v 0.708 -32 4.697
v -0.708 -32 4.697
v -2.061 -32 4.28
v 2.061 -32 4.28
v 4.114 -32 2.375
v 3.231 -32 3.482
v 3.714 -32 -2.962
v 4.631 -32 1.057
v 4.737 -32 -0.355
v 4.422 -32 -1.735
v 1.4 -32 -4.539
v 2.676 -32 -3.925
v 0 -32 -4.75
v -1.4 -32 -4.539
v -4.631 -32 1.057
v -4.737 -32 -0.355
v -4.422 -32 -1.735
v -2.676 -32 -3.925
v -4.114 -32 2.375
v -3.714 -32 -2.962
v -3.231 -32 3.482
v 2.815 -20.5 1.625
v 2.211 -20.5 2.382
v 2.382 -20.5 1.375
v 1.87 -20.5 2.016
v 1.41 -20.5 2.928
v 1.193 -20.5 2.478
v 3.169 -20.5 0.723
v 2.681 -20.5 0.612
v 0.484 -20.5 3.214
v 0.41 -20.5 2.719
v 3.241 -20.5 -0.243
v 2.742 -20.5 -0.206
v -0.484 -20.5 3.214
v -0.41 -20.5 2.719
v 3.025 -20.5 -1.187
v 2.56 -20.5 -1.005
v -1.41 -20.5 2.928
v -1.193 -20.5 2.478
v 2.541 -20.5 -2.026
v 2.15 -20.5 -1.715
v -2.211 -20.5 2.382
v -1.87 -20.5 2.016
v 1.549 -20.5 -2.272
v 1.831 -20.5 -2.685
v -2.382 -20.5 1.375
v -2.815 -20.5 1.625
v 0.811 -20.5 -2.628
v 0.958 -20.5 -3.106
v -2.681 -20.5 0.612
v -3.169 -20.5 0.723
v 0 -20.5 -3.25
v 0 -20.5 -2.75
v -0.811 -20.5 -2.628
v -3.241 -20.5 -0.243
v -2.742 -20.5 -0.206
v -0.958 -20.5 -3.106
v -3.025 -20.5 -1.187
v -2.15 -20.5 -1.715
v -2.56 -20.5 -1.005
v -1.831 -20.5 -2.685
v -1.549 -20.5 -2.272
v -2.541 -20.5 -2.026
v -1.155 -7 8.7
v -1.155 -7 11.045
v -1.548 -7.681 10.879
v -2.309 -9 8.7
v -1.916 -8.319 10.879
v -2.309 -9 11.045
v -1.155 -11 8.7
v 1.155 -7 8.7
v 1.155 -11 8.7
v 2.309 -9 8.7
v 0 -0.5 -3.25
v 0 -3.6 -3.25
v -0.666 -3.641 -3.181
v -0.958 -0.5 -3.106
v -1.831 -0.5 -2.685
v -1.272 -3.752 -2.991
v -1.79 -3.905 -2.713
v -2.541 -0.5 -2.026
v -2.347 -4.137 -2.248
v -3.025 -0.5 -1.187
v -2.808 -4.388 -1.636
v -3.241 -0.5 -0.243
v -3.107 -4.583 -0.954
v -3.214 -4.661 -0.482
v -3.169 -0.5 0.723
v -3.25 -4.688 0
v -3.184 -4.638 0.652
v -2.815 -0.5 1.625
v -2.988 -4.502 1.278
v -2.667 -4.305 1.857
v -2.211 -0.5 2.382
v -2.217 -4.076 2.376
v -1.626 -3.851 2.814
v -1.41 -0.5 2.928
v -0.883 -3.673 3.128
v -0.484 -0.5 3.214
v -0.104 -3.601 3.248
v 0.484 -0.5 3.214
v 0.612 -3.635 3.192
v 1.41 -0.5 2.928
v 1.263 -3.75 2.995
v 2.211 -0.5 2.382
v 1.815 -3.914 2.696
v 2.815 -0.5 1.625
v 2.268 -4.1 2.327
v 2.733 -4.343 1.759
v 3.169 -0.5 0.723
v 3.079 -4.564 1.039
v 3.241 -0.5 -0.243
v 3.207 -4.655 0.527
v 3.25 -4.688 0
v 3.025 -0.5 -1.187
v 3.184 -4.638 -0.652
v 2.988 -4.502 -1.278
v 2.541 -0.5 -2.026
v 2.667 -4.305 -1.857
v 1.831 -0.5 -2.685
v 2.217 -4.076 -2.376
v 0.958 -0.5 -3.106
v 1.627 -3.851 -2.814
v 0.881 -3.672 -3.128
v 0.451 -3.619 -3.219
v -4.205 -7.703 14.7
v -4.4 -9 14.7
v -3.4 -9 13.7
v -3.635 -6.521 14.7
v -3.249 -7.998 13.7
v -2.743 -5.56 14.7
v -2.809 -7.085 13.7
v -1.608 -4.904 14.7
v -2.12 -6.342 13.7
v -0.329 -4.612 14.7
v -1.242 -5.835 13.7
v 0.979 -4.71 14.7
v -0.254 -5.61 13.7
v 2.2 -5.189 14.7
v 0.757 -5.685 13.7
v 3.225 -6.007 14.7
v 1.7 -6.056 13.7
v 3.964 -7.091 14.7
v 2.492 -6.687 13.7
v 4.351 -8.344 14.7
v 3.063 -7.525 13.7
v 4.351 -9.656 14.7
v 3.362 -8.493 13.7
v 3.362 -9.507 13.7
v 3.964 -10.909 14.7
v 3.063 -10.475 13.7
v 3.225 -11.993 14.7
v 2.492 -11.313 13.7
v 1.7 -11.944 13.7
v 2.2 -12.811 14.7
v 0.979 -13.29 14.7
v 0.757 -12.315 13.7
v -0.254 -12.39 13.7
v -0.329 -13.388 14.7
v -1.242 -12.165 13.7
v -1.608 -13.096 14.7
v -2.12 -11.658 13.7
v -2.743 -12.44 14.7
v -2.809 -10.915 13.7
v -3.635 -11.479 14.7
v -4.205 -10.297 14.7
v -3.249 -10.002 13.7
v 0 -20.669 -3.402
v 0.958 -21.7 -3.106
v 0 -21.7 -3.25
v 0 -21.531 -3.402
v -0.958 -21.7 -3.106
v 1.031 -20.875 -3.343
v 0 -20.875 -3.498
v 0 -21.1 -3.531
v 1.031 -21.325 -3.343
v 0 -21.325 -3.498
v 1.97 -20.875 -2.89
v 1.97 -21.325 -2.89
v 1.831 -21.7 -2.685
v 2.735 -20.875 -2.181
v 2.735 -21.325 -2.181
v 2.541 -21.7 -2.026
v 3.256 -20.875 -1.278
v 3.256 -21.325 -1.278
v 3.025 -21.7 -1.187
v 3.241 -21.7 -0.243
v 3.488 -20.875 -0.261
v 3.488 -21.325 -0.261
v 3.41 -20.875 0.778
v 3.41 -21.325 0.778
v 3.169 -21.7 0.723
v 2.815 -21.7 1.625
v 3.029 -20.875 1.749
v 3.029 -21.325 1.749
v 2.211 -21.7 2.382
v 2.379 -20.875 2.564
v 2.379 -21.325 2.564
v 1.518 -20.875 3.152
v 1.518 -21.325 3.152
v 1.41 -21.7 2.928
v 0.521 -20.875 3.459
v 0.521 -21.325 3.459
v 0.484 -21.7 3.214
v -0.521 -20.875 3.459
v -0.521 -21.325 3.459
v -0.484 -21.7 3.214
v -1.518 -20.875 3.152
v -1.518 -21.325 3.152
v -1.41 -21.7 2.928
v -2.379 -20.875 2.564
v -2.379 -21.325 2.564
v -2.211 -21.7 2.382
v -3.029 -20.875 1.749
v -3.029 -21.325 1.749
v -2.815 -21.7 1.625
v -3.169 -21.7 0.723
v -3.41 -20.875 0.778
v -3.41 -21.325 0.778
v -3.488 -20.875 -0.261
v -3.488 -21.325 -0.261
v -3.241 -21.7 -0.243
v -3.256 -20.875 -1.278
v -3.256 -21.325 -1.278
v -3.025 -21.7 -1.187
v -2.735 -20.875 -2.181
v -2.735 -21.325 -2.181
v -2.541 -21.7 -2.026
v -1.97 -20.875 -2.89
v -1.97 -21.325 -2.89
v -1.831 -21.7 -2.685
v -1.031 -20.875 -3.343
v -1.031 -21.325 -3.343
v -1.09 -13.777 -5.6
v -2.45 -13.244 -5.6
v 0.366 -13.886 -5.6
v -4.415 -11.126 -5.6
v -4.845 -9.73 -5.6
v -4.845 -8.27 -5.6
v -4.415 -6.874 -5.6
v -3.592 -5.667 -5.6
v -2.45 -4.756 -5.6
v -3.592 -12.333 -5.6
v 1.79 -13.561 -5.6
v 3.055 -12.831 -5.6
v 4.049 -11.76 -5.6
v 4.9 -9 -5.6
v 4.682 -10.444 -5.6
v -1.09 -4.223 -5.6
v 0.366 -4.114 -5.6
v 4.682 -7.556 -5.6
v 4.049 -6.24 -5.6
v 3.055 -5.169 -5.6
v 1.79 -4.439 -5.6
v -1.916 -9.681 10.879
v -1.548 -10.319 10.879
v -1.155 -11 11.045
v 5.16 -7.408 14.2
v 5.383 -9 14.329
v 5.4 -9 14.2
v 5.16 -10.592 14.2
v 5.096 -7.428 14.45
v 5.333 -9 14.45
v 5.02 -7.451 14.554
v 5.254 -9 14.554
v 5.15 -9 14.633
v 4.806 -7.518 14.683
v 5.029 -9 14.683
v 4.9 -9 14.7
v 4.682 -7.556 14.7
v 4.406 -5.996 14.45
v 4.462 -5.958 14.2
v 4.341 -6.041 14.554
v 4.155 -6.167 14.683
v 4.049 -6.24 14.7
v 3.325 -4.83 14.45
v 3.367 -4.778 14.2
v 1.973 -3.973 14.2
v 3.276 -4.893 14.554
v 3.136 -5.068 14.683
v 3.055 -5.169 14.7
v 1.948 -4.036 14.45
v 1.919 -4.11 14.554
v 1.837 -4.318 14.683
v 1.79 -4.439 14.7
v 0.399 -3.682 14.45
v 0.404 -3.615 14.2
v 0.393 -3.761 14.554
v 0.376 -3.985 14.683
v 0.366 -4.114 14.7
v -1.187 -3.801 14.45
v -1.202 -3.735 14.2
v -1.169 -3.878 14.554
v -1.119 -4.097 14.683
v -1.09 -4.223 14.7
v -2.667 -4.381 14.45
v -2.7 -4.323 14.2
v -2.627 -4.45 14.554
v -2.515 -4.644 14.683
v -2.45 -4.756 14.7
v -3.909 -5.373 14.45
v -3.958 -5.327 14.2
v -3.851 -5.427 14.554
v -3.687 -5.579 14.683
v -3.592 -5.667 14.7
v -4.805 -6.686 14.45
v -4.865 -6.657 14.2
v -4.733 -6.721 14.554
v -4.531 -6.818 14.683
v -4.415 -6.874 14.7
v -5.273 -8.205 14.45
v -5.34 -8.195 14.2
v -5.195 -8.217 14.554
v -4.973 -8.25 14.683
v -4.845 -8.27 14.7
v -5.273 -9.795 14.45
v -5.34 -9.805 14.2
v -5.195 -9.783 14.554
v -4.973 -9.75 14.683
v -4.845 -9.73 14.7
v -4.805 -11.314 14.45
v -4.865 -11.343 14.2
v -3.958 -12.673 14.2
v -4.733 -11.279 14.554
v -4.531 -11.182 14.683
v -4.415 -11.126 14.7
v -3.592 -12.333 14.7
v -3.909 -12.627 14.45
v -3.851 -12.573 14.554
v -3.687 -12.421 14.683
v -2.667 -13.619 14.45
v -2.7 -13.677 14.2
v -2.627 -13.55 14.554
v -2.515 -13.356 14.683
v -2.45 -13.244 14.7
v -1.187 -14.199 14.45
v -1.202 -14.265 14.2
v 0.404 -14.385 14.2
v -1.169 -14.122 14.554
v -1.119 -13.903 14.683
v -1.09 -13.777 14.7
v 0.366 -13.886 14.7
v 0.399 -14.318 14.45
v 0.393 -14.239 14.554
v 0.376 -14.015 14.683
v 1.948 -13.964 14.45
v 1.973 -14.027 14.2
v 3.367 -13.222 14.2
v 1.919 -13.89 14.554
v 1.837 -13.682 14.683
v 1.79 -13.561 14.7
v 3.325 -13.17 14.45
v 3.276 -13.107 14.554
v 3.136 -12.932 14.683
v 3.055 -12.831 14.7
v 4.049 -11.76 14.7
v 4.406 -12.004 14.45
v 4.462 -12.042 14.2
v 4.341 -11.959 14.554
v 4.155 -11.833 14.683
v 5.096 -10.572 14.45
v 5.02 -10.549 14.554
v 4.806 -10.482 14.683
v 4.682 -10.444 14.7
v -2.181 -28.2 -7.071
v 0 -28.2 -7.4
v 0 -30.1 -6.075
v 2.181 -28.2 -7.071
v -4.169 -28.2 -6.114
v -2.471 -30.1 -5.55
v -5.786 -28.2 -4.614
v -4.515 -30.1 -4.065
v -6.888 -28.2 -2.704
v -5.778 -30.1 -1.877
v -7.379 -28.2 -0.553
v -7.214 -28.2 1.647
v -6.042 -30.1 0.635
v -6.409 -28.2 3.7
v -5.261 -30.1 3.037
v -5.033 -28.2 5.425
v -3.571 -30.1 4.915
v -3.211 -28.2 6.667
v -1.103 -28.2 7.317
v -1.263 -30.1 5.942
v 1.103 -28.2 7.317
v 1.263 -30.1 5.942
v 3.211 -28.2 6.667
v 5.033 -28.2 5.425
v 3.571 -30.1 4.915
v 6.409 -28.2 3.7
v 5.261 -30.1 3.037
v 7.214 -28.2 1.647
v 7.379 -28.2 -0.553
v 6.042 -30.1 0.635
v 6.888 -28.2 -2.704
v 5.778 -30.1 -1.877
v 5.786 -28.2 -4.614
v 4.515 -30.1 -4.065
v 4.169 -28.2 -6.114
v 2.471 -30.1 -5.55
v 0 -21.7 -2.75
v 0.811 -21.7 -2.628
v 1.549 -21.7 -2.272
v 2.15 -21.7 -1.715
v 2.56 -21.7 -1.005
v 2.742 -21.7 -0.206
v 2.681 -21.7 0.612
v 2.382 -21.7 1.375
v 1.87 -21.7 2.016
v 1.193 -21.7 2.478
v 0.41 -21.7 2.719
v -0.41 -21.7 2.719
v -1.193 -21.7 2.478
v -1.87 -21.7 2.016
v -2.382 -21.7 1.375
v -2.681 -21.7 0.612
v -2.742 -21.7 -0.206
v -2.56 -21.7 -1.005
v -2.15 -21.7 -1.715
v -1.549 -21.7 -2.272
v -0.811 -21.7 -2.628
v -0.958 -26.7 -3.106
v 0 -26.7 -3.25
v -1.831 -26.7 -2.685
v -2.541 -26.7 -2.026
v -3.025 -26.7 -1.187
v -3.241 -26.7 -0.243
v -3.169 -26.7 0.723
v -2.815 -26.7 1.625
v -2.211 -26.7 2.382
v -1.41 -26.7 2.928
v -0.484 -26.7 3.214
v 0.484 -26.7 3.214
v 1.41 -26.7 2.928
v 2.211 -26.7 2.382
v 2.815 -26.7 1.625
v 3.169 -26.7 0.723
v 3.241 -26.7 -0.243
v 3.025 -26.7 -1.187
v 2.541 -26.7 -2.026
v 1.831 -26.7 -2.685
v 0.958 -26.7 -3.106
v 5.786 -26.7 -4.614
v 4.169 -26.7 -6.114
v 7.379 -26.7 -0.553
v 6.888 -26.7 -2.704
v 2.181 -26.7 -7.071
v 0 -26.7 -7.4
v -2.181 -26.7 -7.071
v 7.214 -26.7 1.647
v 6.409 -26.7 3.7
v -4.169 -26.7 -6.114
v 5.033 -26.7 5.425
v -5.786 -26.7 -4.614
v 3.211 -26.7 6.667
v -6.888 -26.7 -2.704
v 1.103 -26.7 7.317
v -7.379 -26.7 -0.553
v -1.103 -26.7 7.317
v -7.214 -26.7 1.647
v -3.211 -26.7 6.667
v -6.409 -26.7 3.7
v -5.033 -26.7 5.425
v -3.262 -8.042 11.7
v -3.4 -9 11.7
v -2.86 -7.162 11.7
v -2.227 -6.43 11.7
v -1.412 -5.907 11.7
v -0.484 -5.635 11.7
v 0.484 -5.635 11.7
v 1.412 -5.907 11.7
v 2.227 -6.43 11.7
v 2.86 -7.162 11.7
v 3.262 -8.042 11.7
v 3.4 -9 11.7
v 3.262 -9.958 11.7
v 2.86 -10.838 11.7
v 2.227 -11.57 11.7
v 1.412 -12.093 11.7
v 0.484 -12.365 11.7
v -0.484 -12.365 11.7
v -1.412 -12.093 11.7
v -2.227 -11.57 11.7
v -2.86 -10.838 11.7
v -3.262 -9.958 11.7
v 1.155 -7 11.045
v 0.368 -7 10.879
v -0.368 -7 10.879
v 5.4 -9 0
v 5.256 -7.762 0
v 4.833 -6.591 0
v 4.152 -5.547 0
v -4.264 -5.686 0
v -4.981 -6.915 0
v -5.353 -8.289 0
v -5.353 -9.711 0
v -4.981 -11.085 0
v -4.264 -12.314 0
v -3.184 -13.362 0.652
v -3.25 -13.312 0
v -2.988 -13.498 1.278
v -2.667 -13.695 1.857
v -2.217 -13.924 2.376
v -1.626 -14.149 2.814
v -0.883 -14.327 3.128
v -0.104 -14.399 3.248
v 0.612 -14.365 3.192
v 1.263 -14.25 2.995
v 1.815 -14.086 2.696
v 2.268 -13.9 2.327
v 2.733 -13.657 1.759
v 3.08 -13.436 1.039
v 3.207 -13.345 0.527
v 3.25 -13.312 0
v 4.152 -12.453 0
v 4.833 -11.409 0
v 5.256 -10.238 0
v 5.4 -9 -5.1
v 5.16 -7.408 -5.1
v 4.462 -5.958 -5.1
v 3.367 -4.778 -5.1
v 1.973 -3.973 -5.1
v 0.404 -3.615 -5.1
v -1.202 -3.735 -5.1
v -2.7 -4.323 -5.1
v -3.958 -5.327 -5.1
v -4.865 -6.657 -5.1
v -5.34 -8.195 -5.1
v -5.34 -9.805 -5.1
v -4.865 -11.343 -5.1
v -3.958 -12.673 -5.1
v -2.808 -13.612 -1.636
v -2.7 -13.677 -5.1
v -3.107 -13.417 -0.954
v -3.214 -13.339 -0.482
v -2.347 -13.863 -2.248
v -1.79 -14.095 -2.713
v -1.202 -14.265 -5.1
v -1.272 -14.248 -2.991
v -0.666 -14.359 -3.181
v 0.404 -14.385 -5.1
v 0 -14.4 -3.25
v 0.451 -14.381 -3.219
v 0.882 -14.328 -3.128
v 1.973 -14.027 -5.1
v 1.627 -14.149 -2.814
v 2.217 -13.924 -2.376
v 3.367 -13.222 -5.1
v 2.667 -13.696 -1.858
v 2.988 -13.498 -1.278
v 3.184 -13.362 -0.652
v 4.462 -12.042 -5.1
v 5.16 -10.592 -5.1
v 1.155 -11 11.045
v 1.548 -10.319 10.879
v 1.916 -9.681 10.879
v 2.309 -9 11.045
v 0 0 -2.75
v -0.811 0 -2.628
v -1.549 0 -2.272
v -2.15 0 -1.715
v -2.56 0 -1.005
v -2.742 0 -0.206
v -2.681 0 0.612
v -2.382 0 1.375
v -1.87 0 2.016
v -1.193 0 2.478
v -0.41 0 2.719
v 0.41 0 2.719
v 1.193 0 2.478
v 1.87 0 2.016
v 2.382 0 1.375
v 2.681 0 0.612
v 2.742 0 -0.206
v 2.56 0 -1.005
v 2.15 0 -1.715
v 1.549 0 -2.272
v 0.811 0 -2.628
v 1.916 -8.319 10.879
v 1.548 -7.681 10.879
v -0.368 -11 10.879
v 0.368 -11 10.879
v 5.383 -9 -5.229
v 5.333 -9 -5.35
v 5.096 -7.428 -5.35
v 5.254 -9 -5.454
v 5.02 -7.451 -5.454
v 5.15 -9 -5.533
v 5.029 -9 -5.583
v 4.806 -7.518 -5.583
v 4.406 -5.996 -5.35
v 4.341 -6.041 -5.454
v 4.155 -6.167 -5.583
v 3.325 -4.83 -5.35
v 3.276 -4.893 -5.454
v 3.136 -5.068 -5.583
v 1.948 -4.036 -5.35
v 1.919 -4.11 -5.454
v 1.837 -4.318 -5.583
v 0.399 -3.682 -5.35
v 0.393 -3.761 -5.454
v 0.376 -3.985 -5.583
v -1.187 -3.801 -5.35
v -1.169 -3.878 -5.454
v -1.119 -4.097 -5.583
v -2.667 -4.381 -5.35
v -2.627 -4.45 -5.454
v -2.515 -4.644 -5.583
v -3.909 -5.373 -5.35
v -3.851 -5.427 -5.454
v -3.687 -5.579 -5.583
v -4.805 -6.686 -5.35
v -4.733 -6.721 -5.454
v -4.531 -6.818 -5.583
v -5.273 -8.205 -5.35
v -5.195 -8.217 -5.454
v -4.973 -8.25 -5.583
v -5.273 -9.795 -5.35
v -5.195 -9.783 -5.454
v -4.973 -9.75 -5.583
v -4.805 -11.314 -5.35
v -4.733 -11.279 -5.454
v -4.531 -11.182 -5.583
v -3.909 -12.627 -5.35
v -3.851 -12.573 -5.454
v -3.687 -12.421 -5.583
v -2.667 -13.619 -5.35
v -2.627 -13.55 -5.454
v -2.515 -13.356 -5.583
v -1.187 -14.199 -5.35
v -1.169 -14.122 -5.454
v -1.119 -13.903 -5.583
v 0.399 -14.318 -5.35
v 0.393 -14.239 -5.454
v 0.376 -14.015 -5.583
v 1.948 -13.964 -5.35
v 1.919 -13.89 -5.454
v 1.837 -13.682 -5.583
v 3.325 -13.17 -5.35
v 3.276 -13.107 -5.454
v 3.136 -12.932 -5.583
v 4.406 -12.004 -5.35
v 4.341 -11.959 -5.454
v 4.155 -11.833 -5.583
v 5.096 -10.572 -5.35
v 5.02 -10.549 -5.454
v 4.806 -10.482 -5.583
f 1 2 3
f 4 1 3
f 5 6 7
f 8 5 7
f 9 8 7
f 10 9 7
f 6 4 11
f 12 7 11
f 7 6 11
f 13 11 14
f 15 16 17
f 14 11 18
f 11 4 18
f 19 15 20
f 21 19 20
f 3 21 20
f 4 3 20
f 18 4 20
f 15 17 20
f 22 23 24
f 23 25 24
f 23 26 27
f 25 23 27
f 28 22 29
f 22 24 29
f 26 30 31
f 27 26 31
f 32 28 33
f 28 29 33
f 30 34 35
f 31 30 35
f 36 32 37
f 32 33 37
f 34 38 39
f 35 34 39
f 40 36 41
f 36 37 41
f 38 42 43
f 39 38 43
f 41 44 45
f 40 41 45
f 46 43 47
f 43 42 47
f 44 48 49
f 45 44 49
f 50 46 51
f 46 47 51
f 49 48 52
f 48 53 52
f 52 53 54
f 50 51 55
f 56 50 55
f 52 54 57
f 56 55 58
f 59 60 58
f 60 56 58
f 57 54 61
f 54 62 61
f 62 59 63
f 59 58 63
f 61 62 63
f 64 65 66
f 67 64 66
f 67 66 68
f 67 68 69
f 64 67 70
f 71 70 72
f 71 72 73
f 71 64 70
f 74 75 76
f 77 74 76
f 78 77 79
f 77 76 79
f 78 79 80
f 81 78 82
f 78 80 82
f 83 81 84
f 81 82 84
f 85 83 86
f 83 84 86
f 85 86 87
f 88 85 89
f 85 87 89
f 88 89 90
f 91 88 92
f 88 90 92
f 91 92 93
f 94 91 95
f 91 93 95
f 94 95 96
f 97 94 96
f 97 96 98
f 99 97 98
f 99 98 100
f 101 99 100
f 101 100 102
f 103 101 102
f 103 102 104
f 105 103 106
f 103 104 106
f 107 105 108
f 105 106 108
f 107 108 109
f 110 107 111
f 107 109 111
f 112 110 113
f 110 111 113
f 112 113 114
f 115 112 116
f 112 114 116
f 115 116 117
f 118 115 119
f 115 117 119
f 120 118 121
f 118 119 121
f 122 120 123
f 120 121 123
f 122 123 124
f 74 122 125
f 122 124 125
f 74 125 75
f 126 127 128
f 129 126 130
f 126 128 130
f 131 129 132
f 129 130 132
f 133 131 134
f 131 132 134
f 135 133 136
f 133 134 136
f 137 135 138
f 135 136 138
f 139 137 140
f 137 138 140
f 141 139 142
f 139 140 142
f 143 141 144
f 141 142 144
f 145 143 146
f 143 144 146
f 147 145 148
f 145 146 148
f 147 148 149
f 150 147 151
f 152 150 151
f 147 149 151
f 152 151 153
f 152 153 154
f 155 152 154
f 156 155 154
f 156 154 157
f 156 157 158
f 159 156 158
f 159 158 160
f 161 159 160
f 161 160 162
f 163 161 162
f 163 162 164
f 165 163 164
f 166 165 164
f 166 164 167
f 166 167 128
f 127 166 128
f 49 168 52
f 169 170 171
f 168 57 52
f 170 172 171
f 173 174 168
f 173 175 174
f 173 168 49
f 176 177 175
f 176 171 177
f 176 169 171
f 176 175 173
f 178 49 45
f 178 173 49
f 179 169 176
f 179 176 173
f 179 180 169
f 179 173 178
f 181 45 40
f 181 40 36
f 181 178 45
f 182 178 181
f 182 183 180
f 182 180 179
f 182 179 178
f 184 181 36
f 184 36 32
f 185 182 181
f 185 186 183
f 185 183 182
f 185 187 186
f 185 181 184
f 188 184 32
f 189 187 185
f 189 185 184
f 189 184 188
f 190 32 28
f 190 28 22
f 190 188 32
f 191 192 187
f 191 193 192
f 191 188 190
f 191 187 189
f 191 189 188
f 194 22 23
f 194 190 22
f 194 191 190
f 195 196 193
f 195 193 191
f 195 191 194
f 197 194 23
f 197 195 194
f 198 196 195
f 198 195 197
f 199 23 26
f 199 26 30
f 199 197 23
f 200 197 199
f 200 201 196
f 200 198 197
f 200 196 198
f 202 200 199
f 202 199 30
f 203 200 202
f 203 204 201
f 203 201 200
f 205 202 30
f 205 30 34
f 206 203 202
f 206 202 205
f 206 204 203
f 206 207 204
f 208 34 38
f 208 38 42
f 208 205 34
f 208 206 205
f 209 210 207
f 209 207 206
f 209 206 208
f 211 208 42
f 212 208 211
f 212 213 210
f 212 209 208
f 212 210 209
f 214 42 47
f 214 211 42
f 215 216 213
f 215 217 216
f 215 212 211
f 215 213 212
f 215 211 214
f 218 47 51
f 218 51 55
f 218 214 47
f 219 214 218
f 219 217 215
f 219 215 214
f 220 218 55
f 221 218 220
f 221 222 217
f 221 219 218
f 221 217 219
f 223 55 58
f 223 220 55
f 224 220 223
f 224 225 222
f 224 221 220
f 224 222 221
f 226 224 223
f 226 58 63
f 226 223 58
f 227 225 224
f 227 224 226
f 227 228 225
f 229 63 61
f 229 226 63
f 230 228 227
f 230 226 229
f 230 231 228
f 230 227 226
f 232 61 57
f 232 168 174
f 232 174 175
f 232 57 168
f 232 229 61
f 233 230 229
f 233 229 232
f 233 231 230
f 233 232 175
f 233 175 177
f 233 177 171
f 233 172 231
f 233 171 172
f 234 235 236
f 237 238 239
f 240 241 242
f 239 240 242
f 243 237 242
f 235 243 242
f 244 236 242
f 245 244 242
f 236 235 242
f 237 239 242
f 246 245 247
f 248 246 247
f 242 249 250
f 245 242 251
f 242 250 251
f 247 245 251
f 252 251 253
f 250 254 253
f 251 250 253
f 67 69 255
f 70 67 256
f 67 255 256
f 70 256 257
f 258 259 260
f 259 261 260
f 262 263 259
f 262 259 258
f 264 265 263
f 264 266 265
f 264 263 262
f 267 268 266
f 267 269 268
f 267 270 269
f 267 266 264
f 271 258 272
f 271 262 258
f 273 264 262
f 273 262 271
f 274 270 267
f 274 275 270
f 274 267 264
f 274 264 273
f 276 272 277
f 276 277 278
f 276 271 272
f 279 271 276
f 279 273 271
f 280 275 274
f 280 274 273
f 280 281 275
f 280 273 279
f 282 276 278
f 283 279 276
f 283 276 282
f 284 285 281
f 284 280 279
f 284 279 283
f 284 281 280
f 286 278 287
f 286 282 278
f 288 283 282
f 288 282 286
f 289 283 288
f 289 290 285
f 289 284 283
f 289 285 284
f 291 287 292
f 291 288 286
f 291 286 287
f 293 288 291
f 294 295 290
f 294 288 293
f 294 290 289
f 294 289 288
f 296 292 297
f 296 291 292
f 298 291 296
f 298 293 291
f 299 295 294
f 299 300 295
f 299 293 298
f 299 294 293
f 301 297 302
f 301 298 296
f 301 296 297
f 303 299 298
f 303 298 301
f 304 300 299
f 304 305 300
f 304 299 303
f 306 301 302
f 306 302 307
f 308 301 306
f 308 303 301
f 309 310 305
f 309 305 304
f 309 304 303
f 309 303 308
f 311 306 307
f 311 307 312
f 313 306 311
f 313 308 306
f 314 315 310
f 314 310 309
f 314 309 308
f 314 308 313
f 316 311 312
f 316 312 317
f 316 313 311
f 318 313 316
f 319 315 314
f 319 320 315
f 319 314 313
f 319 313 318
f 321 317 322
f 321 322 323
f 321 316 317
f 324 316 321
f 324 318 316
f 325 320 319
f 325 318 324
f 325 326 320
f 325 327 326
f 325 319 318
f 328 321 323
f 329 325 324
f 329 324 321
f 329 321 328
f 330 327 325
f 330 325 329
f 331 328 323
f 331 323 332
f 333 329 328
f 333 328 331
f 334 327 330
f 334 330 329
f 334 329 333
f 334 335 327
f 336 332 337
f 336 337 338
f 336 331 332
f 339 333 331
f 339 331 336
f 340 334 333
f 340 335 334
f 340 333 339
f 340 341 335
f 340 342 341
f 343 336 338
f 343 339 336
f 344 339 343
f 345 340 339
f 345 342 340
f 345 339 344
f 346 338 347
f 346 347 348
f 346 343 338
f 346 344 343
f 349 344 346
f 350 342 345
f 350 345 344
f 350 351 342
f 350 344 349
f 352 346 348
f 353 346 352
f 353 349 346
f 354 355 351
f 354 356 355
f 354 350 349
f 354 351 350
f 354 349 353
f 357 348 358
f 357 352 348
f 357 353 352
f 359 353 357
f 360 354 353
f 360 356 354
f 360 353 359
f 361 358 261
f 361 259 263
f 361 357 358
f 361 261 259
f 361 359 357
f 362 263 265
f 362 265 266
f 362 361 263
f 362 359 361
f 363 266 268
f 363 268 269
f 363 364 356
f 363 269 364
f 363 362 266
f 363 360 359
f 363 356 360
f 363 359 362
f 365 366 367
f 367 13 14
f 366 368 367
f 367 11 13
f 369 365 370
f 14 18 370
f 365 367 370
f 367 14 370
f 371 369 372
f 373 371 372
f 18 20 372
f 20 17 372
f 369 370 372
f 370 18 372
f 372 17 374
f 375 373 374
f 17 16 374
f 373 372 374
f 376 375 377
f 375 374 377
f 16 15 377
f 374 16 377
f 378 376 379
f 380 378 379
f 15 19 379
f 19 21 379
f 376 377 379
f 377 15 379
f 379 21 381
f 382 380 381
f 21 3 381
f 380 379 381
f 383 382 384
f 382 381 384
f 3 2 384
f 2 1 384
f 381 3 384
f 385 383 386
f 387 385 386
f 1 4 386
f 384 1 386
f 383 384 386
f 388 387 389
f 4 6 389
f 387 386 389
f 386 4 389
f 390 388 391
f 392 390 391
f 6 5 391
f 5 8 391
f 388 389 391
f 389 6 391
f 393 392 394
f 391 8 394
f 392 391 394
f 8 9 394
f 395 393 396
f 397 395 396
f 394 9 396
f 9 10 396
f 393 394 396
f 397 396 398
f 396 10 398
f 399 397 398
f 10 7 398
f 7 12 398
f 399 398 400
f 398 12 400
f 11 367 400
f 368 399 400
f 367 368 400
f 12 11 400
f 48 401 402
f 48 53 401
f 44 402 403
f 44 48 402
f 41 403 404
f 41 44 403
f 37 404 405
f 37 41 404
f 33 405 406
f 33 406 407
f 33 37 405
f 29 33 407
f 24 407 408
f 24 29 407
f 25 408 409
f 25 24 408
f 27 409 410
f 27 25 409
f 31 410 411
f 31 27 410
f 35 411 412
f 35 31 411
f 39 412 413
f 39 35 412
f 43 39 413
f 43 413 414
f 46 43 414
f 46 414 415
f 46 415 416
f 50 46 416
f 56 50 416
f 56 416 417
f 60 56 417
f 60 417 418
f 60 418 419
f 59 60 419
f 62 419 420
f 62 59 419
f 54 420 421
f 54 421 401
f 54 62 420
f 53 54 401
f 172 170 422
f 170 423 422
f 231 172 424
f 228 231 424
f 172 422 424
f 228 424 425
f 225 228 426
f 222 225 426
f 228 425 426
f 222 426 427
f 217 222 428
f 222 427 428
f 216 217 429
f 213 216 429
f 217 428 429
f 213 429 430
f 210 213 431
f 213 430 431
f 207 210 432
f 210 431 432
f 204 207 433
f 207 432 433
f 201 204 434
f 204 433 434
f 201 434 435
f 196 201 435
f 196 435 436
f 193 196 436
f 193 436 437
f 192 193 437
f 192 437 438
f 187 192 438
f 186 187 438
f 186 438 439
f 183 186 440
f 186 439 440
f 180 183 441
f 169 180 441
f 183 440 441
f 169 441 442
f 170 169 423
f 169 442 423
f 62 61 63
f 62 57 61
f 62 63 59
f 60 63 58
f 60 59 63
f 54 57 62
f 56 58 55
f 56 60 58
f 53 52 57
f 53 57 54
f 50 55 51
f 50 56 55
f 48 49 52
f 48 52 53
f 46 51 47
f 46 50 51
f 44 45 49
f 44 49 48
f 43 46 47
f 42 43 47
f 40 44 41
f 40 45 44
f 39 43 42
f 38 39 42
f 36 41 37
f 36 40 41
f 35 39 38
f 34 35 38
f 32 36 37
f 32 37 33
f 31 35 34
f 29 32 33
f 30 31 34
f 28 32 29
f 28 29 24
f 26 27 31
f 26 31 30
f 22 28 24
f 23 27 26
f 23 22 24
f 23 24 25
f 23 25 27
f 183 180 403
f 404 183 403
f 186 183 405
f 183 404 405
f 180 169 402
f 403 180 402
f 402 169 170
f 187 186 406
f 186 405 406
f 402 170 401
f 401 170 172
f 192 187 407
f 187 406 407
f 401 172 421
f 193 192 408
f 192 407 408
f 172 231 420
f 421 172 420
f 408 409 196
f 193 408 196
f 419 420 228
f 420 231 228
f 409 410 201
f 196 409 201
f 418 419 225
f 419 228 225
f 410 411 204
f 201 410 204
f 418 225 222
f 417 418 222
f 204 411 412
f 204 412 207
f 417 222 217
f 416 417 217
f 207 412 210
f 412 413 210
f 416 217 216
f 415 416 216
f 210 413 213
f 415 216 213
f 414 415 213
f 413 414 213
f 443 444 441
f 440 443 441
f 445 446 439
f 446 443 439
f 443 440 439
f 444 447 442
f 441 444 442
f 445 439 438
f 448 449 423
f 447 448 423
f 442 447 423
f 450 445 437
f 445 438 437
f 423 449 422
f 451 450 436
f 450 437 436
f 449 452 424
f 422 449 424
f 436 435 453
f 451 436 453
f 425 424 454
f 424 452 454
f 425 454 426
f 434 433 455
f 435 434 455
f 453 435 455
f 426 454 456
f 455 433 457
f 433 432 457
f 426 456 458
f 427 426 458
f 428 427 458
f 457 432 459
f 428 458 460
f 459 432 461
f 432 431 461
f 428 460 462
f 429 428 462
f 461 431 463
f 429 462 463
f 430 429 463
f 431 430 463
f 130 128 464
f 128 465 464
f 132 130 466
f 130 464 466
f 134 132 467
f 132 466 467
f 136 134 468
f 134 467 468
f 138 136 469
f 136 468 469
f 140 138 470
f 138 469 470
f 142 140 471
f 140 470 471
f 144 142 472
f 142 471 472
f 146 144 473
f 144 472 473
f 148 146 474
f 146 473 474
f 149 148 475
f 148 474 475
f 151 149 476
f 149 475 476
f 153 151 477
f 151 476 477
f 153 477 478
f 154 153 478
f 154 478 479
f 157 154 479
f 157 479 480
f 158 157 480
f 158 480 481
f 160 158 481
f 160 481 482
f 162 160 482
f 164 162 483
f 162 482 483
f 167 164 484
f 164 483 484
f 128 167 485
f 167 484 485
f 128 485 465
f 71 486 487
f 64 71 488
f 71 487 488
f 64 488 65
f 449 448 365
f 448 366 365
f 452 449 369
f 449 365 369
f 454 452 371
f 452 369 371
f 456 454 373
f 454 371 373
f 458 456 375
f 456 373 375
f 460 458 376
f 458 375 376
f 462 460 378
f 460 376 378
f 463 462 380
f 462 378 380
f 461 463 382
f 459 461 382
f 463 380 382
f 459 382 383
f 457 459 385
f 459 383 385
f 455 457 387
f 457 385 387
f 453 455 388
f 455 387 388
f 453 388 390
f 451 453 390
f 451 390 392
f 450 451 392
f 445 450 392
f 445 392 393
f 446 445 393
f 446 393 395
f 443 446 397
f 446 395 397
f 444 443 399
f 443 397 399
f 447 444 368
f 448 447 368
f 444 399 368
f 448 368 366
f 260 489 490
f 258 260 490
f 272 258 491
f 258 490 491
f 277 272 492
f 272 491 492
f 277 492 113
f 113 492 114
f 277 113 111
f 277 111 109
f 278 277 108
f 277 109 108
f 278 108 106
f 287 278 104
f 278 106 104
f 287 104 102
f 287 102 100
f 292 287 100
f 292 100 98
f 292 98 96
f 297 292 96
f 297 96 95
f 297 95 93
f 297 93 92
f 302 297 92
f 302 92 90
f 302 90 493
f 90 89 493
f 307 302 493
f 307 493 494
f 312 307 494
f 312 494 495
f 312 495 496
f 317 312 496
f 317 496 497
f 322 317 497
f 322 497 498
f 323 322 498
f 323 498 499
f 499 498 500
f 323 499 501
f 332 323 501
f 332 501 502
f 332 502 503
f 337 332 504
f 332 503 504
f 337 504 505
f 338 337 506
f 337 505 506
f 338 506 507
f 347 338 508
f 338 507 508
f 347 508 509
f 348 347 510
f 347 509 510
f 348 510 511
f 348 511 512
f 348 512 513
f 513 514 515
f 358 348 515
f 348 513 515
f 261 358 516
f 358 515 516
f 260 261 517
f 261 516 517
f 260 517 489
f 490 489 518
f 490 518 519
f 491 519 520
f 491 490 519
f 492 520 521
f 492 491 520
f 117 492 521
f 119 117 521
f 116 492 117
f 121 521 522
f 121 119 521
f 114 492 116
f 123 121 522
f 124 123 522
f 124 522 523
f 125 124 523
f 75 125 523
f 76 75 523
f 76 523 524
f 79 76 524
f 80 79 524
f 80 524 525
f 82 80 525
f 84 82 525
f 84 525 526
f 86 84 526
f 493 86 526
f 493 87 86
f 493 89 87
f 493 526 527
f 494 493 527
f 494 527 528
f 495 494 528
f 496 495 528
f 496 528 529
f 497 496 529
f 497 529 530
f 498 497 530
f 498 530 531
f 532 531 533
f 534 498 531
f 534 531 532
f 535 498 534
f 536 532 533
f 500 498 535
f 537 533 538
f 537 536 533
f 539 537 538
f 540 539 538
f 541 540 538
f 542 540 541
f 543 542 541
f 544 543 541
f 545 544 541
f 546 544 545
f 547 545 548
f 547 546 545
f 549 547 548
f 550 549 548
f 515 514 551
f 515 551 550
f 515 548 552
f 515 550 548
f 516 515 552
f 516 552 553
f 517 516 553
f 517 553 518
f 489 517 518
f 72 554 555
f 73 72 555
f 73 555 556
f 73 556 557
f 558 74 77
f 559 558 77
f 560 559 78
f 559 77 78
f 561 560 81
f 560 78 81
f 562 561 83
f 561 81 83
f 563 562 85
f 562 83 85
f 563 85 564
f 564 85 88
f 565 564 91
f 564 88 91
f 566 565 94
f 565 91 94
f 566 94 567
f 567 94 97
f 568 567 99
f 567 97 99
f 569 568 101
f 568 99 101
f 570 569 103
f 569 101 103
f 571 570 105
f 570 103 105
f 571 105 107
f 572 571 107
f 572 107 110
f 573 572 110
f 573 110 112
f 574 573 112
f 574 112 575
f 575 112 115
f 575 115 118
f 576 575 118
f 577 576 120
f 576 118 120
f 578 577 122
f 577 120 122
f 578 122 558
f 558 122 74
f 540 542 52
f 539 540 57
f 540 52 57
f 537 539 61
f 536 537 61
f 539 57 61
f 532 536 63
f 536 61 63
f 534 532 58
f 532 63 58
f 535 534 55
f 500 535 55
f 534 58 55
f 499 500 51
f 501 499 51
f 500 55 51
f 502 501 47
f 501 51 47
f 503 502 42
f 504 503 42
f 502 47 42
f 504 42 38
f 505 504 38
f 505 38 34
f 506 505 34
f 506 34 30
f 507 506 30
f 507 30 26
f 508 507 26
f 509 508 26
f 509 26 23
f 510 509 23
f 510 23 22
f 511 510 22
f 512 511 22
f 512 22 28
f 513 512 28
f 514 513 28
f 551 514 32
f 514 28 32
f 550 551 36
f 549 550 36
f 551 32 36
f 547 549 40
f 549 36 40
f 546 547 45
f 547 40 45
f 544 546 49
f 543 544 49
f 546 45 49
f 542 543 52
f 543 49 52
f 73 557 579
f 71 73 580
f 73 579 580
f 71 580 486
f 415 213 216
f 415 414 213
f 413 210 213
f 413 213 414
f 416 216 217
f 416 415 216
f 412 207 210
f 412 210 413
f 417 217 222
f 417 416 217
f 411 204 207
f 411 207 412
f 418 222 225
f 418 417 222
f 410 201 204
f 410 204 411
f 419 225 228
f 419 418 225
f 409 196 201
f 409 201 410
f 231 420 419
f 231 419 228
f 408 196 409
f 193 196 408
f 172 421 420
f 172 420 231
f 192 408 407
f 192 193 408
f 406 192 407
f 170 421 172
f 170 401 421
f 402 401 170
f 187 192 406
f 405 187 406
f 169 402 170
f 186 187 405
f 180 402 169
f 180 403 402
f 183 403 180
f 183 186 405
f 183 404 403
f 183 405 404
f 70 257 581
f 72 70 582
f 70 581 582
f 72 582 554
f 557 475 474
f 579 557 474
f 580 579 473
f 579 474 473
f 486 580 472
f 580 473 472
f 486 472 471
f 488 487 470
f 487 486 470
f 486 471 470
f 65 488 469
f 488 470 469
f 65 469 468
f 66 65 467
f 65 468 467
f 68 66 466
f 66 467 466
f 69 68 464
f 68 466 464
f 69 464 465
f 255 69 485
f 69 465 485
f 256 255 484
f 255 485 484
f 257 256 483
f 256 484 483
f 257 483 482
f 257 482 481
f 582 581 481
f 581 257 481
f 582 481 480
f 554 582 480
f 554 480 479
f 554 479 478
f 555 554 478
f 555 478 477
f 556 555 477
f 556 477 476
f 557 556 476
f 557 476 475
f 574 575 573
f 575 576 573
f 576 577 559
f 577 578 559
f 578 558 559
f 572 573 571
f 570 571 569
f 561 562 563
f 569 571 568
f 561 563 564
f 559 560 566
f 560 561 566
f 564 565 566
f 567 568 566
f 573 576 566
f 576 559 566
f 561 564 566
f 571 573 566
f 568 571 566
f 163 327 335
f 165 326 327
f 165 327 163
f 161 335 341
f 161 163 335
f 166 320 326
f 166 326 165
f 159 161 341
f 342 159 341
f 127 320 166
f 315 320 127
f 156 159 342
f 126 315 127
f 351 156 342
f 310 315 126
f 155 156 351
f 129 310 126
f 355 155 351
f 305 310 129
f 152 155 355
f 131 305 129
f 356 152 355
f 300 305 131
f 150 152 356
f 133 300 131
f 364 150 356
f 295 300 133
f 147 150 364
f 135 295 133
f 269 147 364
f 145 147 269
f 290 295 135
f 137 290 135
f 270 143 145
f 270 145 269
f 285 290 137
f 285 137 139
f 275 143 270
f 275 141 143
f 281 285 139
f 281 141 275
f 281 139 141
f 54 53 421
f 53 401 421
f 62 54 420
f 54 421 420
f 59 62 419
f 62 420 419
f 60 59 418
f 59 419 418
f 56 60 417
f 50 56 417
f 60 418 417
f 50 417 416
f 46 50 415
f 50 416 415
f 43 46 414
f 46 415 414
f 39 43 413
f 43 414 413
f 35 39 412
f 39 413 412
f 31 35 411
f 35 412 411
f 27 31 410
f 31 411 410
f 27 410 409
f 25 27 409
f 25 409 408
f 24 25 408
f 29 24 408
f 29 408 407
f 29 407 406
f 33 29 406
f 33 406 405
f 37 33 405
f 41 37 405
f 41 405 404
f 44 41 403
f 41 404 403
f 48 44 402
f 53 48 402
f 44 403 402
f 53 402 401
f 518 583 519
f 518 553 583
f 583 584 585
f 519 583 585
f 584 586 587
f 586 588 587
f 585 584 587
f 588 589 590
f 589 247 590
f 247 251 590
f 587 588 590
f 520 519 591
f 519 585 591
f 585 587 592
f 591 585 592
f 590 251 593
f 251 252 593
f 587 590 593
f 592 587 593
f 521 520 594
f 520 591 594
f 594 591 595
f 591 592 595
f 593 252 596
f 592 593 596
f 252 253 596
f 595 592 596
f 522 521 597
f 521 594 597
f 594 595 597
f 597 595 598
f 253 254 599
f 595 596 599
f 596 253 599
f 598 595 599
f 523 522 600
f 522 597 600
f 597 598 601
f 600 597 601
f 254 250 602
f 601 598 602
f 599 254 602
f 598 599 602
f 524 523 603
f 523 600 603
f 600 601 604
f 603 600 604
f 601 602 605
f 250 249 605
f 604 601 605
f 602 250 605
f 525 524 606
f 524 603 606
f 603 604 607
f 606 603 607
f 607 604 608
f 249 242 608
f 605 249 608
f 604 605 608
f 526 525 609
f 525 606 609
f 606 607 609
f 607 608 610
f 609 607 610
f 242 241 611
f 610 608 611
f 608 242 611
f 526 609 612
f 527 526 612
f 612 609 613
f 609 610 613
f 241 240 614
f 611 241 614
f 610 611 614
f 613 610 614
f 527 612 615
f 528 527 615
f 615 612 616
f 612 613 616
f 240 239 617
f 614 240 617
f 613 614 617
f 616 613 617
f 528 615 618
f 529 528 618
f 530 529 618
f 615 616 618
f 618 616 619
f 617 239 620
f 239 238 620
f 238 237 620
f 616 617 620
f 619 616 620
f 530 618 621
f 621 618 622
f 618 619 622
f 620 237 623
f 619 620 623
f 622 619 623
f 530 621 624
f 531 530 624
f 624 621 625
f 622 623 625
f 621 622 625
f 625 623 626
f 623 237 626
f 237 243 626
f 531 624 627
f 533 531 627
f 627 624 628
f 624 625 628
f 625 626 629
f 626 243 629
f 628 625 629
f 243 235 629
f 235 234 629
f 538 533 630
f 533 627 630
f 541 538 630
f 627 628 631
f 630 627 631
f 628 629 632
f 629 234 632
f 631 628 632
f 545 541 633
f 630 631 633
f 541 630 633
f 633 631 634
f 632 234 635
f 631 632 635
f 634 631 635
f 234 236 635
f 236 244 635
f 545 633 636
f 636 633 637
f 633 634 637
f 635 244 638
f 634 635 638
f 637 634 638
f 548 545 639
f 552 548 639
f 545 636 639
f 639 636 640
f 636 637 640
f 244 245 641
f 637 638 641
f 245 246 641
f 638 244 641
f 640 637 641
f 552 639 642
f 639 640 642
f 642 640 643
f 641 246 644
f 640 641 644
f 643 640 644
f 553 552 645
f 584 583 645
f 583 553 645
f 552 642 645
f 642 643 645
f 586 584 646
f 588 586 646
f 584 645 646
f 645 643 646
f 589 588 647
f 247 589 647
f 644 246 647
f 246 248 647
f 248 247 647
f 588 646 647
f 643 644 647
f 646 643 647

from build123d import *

# Parameters (mm, degrees)
CHAMFER_1_SIZE              = 0.5
SKETCH_12_R                 = 5.4
EXTRUDE_2_DEPTH             = 14.7
EXTRUDE_2_DEPTH_BACK        = 5.6
HOLE_WIZARD_M81_D           = 6.8
HOLE_WIZARD_M81_DEPTH       = 3
HOLE_WIZARD_M81_CSINK_D     = 8.8
HOLE_WIZARD_M81_CSINK_ANGLE = 90
HOLE_WIZARD_M81_TIP         = 2.042926105
FILLET_1_R                  = 0.5
CUT_EXTRUDE_2_DEPTH         = 6


with BuildPart() as part:
    # Эскиз3 → Повернуть1 (revolve)
    with BuildSketch(Plane.XY, mode=Mode.PRIVATE) as revolve_1_sk:
        Polygon((0, 0), (-3.25, 0), (-3.25, -20.5), (-2.75, -20.5), (-2.75, -21.7), (-3.25, -21.7), (-3.25, -26.7), (-7.4, -26.7), (-7.4, -28.2), (-4.75, -32), (0, -32), align=None)
    revolve(revolve_1_sk.sketch.rotate(Axis((0, 0, 0), (0, 1, 0)), 270), axis=Axis((0, 0, 0), (0, 1, 0)))  # turned: the seam where the file's is

    # Фаска1
    chamfer_1_edges = [part.edges().sort_by_distance(p)[0] for p in [
        (0, 0, 3.25),
    ]]
    chamfer(chamfer_1_edges, length=CHAMFER_1_SIZE)

    # Эскиз12 → Бобышка-Вытянуть2 (add, two sides)
    with BuildSketch(Plane.XY) as extrude_2_sk:
        with Locations((0, -9)):
            Circle(SKETCH_12_R)
    extrude(amount=EXTRUDE_2_DEPTH)
    extrude(extrude_2_sk.sketch, amount=-EXTRUDE_2_DEPTH_BACK)

    # Отверстие обработанное метчиком M81
    with Locations(Plane.XY.offset(14.7)):
        with Locations((0, -9)):
            CounterSinkHole(HOLE_WIZARD_M81_D / 2, HOLE_WIZARD_M81_CSINK_D / 2, depth=HOLE_WIZARD_M81_DEPTH, counter_sink_angle=HOLE_WIZARD_M81_CSINK_ANGLE)
            with Locations((0, 0, -(HOLE_WIZARD_M81_DEPTH + HOLE_WIZARD_M81_TIP / 2))):  # 118° drill point
                Cone(0, HOLE_WIZARD_M81_D / 2, HOLE_WIZARD_M81_TIP, mode=Mode.SUBTRACT)

    # Скругление1
    fillet_1_edges = [part.edges().sort_by_distance(p)[0] for p in [
        (-5.4, -9, -5.6),
        (-5.4, -9, 14.7),
    ]]
    fillet(fillet_1_edges, radius=FILLET_1_R)

    # Эскиз15 → Вырез-Вытянуть2 (cut)
    with BuildSketch(Plane.XY.offset(14.7)):
        Polygon((2.309401077, -9), (1.154700538, -7), (-1.154700538, -7), (-2.309401077, -9), (-1.154700538, -11), (1.154700538, -11), align=None)
    extrude(amount=-CUT_EXTRUDE_2_DEPTH, mode=Mode.SUBTRACT)


with BuildPart() as body_2:
    # Эскиз16 → Повернуть2 (revolve)
    with BuildSketch(Plane.XY, mode=Mode.PRIVATE) as revolve_2_sk:
        with BuildLine():
            Line((-2.75, -20.5), (-3.25, -20.5))
            ThreePointArc((-3.25, -20.5), (-3.531024968, -21.1), (-3.25, -21.7))
            Line((-3.25, -21.7), (-2.75, -21.7))
            Line((-2.75, -21.7), (-2.75, -20.5))
        make_face()
    revolve(revolve_2_sk.sketch.rotate(Axis((0, -20.5, 0), (0, -1, 0)), 90), axis=Axis((0, -20.5, 0), (0, -1, 0)))  # turned: the seam where the file's is


solid = Compound([part.part, body_2.part])
